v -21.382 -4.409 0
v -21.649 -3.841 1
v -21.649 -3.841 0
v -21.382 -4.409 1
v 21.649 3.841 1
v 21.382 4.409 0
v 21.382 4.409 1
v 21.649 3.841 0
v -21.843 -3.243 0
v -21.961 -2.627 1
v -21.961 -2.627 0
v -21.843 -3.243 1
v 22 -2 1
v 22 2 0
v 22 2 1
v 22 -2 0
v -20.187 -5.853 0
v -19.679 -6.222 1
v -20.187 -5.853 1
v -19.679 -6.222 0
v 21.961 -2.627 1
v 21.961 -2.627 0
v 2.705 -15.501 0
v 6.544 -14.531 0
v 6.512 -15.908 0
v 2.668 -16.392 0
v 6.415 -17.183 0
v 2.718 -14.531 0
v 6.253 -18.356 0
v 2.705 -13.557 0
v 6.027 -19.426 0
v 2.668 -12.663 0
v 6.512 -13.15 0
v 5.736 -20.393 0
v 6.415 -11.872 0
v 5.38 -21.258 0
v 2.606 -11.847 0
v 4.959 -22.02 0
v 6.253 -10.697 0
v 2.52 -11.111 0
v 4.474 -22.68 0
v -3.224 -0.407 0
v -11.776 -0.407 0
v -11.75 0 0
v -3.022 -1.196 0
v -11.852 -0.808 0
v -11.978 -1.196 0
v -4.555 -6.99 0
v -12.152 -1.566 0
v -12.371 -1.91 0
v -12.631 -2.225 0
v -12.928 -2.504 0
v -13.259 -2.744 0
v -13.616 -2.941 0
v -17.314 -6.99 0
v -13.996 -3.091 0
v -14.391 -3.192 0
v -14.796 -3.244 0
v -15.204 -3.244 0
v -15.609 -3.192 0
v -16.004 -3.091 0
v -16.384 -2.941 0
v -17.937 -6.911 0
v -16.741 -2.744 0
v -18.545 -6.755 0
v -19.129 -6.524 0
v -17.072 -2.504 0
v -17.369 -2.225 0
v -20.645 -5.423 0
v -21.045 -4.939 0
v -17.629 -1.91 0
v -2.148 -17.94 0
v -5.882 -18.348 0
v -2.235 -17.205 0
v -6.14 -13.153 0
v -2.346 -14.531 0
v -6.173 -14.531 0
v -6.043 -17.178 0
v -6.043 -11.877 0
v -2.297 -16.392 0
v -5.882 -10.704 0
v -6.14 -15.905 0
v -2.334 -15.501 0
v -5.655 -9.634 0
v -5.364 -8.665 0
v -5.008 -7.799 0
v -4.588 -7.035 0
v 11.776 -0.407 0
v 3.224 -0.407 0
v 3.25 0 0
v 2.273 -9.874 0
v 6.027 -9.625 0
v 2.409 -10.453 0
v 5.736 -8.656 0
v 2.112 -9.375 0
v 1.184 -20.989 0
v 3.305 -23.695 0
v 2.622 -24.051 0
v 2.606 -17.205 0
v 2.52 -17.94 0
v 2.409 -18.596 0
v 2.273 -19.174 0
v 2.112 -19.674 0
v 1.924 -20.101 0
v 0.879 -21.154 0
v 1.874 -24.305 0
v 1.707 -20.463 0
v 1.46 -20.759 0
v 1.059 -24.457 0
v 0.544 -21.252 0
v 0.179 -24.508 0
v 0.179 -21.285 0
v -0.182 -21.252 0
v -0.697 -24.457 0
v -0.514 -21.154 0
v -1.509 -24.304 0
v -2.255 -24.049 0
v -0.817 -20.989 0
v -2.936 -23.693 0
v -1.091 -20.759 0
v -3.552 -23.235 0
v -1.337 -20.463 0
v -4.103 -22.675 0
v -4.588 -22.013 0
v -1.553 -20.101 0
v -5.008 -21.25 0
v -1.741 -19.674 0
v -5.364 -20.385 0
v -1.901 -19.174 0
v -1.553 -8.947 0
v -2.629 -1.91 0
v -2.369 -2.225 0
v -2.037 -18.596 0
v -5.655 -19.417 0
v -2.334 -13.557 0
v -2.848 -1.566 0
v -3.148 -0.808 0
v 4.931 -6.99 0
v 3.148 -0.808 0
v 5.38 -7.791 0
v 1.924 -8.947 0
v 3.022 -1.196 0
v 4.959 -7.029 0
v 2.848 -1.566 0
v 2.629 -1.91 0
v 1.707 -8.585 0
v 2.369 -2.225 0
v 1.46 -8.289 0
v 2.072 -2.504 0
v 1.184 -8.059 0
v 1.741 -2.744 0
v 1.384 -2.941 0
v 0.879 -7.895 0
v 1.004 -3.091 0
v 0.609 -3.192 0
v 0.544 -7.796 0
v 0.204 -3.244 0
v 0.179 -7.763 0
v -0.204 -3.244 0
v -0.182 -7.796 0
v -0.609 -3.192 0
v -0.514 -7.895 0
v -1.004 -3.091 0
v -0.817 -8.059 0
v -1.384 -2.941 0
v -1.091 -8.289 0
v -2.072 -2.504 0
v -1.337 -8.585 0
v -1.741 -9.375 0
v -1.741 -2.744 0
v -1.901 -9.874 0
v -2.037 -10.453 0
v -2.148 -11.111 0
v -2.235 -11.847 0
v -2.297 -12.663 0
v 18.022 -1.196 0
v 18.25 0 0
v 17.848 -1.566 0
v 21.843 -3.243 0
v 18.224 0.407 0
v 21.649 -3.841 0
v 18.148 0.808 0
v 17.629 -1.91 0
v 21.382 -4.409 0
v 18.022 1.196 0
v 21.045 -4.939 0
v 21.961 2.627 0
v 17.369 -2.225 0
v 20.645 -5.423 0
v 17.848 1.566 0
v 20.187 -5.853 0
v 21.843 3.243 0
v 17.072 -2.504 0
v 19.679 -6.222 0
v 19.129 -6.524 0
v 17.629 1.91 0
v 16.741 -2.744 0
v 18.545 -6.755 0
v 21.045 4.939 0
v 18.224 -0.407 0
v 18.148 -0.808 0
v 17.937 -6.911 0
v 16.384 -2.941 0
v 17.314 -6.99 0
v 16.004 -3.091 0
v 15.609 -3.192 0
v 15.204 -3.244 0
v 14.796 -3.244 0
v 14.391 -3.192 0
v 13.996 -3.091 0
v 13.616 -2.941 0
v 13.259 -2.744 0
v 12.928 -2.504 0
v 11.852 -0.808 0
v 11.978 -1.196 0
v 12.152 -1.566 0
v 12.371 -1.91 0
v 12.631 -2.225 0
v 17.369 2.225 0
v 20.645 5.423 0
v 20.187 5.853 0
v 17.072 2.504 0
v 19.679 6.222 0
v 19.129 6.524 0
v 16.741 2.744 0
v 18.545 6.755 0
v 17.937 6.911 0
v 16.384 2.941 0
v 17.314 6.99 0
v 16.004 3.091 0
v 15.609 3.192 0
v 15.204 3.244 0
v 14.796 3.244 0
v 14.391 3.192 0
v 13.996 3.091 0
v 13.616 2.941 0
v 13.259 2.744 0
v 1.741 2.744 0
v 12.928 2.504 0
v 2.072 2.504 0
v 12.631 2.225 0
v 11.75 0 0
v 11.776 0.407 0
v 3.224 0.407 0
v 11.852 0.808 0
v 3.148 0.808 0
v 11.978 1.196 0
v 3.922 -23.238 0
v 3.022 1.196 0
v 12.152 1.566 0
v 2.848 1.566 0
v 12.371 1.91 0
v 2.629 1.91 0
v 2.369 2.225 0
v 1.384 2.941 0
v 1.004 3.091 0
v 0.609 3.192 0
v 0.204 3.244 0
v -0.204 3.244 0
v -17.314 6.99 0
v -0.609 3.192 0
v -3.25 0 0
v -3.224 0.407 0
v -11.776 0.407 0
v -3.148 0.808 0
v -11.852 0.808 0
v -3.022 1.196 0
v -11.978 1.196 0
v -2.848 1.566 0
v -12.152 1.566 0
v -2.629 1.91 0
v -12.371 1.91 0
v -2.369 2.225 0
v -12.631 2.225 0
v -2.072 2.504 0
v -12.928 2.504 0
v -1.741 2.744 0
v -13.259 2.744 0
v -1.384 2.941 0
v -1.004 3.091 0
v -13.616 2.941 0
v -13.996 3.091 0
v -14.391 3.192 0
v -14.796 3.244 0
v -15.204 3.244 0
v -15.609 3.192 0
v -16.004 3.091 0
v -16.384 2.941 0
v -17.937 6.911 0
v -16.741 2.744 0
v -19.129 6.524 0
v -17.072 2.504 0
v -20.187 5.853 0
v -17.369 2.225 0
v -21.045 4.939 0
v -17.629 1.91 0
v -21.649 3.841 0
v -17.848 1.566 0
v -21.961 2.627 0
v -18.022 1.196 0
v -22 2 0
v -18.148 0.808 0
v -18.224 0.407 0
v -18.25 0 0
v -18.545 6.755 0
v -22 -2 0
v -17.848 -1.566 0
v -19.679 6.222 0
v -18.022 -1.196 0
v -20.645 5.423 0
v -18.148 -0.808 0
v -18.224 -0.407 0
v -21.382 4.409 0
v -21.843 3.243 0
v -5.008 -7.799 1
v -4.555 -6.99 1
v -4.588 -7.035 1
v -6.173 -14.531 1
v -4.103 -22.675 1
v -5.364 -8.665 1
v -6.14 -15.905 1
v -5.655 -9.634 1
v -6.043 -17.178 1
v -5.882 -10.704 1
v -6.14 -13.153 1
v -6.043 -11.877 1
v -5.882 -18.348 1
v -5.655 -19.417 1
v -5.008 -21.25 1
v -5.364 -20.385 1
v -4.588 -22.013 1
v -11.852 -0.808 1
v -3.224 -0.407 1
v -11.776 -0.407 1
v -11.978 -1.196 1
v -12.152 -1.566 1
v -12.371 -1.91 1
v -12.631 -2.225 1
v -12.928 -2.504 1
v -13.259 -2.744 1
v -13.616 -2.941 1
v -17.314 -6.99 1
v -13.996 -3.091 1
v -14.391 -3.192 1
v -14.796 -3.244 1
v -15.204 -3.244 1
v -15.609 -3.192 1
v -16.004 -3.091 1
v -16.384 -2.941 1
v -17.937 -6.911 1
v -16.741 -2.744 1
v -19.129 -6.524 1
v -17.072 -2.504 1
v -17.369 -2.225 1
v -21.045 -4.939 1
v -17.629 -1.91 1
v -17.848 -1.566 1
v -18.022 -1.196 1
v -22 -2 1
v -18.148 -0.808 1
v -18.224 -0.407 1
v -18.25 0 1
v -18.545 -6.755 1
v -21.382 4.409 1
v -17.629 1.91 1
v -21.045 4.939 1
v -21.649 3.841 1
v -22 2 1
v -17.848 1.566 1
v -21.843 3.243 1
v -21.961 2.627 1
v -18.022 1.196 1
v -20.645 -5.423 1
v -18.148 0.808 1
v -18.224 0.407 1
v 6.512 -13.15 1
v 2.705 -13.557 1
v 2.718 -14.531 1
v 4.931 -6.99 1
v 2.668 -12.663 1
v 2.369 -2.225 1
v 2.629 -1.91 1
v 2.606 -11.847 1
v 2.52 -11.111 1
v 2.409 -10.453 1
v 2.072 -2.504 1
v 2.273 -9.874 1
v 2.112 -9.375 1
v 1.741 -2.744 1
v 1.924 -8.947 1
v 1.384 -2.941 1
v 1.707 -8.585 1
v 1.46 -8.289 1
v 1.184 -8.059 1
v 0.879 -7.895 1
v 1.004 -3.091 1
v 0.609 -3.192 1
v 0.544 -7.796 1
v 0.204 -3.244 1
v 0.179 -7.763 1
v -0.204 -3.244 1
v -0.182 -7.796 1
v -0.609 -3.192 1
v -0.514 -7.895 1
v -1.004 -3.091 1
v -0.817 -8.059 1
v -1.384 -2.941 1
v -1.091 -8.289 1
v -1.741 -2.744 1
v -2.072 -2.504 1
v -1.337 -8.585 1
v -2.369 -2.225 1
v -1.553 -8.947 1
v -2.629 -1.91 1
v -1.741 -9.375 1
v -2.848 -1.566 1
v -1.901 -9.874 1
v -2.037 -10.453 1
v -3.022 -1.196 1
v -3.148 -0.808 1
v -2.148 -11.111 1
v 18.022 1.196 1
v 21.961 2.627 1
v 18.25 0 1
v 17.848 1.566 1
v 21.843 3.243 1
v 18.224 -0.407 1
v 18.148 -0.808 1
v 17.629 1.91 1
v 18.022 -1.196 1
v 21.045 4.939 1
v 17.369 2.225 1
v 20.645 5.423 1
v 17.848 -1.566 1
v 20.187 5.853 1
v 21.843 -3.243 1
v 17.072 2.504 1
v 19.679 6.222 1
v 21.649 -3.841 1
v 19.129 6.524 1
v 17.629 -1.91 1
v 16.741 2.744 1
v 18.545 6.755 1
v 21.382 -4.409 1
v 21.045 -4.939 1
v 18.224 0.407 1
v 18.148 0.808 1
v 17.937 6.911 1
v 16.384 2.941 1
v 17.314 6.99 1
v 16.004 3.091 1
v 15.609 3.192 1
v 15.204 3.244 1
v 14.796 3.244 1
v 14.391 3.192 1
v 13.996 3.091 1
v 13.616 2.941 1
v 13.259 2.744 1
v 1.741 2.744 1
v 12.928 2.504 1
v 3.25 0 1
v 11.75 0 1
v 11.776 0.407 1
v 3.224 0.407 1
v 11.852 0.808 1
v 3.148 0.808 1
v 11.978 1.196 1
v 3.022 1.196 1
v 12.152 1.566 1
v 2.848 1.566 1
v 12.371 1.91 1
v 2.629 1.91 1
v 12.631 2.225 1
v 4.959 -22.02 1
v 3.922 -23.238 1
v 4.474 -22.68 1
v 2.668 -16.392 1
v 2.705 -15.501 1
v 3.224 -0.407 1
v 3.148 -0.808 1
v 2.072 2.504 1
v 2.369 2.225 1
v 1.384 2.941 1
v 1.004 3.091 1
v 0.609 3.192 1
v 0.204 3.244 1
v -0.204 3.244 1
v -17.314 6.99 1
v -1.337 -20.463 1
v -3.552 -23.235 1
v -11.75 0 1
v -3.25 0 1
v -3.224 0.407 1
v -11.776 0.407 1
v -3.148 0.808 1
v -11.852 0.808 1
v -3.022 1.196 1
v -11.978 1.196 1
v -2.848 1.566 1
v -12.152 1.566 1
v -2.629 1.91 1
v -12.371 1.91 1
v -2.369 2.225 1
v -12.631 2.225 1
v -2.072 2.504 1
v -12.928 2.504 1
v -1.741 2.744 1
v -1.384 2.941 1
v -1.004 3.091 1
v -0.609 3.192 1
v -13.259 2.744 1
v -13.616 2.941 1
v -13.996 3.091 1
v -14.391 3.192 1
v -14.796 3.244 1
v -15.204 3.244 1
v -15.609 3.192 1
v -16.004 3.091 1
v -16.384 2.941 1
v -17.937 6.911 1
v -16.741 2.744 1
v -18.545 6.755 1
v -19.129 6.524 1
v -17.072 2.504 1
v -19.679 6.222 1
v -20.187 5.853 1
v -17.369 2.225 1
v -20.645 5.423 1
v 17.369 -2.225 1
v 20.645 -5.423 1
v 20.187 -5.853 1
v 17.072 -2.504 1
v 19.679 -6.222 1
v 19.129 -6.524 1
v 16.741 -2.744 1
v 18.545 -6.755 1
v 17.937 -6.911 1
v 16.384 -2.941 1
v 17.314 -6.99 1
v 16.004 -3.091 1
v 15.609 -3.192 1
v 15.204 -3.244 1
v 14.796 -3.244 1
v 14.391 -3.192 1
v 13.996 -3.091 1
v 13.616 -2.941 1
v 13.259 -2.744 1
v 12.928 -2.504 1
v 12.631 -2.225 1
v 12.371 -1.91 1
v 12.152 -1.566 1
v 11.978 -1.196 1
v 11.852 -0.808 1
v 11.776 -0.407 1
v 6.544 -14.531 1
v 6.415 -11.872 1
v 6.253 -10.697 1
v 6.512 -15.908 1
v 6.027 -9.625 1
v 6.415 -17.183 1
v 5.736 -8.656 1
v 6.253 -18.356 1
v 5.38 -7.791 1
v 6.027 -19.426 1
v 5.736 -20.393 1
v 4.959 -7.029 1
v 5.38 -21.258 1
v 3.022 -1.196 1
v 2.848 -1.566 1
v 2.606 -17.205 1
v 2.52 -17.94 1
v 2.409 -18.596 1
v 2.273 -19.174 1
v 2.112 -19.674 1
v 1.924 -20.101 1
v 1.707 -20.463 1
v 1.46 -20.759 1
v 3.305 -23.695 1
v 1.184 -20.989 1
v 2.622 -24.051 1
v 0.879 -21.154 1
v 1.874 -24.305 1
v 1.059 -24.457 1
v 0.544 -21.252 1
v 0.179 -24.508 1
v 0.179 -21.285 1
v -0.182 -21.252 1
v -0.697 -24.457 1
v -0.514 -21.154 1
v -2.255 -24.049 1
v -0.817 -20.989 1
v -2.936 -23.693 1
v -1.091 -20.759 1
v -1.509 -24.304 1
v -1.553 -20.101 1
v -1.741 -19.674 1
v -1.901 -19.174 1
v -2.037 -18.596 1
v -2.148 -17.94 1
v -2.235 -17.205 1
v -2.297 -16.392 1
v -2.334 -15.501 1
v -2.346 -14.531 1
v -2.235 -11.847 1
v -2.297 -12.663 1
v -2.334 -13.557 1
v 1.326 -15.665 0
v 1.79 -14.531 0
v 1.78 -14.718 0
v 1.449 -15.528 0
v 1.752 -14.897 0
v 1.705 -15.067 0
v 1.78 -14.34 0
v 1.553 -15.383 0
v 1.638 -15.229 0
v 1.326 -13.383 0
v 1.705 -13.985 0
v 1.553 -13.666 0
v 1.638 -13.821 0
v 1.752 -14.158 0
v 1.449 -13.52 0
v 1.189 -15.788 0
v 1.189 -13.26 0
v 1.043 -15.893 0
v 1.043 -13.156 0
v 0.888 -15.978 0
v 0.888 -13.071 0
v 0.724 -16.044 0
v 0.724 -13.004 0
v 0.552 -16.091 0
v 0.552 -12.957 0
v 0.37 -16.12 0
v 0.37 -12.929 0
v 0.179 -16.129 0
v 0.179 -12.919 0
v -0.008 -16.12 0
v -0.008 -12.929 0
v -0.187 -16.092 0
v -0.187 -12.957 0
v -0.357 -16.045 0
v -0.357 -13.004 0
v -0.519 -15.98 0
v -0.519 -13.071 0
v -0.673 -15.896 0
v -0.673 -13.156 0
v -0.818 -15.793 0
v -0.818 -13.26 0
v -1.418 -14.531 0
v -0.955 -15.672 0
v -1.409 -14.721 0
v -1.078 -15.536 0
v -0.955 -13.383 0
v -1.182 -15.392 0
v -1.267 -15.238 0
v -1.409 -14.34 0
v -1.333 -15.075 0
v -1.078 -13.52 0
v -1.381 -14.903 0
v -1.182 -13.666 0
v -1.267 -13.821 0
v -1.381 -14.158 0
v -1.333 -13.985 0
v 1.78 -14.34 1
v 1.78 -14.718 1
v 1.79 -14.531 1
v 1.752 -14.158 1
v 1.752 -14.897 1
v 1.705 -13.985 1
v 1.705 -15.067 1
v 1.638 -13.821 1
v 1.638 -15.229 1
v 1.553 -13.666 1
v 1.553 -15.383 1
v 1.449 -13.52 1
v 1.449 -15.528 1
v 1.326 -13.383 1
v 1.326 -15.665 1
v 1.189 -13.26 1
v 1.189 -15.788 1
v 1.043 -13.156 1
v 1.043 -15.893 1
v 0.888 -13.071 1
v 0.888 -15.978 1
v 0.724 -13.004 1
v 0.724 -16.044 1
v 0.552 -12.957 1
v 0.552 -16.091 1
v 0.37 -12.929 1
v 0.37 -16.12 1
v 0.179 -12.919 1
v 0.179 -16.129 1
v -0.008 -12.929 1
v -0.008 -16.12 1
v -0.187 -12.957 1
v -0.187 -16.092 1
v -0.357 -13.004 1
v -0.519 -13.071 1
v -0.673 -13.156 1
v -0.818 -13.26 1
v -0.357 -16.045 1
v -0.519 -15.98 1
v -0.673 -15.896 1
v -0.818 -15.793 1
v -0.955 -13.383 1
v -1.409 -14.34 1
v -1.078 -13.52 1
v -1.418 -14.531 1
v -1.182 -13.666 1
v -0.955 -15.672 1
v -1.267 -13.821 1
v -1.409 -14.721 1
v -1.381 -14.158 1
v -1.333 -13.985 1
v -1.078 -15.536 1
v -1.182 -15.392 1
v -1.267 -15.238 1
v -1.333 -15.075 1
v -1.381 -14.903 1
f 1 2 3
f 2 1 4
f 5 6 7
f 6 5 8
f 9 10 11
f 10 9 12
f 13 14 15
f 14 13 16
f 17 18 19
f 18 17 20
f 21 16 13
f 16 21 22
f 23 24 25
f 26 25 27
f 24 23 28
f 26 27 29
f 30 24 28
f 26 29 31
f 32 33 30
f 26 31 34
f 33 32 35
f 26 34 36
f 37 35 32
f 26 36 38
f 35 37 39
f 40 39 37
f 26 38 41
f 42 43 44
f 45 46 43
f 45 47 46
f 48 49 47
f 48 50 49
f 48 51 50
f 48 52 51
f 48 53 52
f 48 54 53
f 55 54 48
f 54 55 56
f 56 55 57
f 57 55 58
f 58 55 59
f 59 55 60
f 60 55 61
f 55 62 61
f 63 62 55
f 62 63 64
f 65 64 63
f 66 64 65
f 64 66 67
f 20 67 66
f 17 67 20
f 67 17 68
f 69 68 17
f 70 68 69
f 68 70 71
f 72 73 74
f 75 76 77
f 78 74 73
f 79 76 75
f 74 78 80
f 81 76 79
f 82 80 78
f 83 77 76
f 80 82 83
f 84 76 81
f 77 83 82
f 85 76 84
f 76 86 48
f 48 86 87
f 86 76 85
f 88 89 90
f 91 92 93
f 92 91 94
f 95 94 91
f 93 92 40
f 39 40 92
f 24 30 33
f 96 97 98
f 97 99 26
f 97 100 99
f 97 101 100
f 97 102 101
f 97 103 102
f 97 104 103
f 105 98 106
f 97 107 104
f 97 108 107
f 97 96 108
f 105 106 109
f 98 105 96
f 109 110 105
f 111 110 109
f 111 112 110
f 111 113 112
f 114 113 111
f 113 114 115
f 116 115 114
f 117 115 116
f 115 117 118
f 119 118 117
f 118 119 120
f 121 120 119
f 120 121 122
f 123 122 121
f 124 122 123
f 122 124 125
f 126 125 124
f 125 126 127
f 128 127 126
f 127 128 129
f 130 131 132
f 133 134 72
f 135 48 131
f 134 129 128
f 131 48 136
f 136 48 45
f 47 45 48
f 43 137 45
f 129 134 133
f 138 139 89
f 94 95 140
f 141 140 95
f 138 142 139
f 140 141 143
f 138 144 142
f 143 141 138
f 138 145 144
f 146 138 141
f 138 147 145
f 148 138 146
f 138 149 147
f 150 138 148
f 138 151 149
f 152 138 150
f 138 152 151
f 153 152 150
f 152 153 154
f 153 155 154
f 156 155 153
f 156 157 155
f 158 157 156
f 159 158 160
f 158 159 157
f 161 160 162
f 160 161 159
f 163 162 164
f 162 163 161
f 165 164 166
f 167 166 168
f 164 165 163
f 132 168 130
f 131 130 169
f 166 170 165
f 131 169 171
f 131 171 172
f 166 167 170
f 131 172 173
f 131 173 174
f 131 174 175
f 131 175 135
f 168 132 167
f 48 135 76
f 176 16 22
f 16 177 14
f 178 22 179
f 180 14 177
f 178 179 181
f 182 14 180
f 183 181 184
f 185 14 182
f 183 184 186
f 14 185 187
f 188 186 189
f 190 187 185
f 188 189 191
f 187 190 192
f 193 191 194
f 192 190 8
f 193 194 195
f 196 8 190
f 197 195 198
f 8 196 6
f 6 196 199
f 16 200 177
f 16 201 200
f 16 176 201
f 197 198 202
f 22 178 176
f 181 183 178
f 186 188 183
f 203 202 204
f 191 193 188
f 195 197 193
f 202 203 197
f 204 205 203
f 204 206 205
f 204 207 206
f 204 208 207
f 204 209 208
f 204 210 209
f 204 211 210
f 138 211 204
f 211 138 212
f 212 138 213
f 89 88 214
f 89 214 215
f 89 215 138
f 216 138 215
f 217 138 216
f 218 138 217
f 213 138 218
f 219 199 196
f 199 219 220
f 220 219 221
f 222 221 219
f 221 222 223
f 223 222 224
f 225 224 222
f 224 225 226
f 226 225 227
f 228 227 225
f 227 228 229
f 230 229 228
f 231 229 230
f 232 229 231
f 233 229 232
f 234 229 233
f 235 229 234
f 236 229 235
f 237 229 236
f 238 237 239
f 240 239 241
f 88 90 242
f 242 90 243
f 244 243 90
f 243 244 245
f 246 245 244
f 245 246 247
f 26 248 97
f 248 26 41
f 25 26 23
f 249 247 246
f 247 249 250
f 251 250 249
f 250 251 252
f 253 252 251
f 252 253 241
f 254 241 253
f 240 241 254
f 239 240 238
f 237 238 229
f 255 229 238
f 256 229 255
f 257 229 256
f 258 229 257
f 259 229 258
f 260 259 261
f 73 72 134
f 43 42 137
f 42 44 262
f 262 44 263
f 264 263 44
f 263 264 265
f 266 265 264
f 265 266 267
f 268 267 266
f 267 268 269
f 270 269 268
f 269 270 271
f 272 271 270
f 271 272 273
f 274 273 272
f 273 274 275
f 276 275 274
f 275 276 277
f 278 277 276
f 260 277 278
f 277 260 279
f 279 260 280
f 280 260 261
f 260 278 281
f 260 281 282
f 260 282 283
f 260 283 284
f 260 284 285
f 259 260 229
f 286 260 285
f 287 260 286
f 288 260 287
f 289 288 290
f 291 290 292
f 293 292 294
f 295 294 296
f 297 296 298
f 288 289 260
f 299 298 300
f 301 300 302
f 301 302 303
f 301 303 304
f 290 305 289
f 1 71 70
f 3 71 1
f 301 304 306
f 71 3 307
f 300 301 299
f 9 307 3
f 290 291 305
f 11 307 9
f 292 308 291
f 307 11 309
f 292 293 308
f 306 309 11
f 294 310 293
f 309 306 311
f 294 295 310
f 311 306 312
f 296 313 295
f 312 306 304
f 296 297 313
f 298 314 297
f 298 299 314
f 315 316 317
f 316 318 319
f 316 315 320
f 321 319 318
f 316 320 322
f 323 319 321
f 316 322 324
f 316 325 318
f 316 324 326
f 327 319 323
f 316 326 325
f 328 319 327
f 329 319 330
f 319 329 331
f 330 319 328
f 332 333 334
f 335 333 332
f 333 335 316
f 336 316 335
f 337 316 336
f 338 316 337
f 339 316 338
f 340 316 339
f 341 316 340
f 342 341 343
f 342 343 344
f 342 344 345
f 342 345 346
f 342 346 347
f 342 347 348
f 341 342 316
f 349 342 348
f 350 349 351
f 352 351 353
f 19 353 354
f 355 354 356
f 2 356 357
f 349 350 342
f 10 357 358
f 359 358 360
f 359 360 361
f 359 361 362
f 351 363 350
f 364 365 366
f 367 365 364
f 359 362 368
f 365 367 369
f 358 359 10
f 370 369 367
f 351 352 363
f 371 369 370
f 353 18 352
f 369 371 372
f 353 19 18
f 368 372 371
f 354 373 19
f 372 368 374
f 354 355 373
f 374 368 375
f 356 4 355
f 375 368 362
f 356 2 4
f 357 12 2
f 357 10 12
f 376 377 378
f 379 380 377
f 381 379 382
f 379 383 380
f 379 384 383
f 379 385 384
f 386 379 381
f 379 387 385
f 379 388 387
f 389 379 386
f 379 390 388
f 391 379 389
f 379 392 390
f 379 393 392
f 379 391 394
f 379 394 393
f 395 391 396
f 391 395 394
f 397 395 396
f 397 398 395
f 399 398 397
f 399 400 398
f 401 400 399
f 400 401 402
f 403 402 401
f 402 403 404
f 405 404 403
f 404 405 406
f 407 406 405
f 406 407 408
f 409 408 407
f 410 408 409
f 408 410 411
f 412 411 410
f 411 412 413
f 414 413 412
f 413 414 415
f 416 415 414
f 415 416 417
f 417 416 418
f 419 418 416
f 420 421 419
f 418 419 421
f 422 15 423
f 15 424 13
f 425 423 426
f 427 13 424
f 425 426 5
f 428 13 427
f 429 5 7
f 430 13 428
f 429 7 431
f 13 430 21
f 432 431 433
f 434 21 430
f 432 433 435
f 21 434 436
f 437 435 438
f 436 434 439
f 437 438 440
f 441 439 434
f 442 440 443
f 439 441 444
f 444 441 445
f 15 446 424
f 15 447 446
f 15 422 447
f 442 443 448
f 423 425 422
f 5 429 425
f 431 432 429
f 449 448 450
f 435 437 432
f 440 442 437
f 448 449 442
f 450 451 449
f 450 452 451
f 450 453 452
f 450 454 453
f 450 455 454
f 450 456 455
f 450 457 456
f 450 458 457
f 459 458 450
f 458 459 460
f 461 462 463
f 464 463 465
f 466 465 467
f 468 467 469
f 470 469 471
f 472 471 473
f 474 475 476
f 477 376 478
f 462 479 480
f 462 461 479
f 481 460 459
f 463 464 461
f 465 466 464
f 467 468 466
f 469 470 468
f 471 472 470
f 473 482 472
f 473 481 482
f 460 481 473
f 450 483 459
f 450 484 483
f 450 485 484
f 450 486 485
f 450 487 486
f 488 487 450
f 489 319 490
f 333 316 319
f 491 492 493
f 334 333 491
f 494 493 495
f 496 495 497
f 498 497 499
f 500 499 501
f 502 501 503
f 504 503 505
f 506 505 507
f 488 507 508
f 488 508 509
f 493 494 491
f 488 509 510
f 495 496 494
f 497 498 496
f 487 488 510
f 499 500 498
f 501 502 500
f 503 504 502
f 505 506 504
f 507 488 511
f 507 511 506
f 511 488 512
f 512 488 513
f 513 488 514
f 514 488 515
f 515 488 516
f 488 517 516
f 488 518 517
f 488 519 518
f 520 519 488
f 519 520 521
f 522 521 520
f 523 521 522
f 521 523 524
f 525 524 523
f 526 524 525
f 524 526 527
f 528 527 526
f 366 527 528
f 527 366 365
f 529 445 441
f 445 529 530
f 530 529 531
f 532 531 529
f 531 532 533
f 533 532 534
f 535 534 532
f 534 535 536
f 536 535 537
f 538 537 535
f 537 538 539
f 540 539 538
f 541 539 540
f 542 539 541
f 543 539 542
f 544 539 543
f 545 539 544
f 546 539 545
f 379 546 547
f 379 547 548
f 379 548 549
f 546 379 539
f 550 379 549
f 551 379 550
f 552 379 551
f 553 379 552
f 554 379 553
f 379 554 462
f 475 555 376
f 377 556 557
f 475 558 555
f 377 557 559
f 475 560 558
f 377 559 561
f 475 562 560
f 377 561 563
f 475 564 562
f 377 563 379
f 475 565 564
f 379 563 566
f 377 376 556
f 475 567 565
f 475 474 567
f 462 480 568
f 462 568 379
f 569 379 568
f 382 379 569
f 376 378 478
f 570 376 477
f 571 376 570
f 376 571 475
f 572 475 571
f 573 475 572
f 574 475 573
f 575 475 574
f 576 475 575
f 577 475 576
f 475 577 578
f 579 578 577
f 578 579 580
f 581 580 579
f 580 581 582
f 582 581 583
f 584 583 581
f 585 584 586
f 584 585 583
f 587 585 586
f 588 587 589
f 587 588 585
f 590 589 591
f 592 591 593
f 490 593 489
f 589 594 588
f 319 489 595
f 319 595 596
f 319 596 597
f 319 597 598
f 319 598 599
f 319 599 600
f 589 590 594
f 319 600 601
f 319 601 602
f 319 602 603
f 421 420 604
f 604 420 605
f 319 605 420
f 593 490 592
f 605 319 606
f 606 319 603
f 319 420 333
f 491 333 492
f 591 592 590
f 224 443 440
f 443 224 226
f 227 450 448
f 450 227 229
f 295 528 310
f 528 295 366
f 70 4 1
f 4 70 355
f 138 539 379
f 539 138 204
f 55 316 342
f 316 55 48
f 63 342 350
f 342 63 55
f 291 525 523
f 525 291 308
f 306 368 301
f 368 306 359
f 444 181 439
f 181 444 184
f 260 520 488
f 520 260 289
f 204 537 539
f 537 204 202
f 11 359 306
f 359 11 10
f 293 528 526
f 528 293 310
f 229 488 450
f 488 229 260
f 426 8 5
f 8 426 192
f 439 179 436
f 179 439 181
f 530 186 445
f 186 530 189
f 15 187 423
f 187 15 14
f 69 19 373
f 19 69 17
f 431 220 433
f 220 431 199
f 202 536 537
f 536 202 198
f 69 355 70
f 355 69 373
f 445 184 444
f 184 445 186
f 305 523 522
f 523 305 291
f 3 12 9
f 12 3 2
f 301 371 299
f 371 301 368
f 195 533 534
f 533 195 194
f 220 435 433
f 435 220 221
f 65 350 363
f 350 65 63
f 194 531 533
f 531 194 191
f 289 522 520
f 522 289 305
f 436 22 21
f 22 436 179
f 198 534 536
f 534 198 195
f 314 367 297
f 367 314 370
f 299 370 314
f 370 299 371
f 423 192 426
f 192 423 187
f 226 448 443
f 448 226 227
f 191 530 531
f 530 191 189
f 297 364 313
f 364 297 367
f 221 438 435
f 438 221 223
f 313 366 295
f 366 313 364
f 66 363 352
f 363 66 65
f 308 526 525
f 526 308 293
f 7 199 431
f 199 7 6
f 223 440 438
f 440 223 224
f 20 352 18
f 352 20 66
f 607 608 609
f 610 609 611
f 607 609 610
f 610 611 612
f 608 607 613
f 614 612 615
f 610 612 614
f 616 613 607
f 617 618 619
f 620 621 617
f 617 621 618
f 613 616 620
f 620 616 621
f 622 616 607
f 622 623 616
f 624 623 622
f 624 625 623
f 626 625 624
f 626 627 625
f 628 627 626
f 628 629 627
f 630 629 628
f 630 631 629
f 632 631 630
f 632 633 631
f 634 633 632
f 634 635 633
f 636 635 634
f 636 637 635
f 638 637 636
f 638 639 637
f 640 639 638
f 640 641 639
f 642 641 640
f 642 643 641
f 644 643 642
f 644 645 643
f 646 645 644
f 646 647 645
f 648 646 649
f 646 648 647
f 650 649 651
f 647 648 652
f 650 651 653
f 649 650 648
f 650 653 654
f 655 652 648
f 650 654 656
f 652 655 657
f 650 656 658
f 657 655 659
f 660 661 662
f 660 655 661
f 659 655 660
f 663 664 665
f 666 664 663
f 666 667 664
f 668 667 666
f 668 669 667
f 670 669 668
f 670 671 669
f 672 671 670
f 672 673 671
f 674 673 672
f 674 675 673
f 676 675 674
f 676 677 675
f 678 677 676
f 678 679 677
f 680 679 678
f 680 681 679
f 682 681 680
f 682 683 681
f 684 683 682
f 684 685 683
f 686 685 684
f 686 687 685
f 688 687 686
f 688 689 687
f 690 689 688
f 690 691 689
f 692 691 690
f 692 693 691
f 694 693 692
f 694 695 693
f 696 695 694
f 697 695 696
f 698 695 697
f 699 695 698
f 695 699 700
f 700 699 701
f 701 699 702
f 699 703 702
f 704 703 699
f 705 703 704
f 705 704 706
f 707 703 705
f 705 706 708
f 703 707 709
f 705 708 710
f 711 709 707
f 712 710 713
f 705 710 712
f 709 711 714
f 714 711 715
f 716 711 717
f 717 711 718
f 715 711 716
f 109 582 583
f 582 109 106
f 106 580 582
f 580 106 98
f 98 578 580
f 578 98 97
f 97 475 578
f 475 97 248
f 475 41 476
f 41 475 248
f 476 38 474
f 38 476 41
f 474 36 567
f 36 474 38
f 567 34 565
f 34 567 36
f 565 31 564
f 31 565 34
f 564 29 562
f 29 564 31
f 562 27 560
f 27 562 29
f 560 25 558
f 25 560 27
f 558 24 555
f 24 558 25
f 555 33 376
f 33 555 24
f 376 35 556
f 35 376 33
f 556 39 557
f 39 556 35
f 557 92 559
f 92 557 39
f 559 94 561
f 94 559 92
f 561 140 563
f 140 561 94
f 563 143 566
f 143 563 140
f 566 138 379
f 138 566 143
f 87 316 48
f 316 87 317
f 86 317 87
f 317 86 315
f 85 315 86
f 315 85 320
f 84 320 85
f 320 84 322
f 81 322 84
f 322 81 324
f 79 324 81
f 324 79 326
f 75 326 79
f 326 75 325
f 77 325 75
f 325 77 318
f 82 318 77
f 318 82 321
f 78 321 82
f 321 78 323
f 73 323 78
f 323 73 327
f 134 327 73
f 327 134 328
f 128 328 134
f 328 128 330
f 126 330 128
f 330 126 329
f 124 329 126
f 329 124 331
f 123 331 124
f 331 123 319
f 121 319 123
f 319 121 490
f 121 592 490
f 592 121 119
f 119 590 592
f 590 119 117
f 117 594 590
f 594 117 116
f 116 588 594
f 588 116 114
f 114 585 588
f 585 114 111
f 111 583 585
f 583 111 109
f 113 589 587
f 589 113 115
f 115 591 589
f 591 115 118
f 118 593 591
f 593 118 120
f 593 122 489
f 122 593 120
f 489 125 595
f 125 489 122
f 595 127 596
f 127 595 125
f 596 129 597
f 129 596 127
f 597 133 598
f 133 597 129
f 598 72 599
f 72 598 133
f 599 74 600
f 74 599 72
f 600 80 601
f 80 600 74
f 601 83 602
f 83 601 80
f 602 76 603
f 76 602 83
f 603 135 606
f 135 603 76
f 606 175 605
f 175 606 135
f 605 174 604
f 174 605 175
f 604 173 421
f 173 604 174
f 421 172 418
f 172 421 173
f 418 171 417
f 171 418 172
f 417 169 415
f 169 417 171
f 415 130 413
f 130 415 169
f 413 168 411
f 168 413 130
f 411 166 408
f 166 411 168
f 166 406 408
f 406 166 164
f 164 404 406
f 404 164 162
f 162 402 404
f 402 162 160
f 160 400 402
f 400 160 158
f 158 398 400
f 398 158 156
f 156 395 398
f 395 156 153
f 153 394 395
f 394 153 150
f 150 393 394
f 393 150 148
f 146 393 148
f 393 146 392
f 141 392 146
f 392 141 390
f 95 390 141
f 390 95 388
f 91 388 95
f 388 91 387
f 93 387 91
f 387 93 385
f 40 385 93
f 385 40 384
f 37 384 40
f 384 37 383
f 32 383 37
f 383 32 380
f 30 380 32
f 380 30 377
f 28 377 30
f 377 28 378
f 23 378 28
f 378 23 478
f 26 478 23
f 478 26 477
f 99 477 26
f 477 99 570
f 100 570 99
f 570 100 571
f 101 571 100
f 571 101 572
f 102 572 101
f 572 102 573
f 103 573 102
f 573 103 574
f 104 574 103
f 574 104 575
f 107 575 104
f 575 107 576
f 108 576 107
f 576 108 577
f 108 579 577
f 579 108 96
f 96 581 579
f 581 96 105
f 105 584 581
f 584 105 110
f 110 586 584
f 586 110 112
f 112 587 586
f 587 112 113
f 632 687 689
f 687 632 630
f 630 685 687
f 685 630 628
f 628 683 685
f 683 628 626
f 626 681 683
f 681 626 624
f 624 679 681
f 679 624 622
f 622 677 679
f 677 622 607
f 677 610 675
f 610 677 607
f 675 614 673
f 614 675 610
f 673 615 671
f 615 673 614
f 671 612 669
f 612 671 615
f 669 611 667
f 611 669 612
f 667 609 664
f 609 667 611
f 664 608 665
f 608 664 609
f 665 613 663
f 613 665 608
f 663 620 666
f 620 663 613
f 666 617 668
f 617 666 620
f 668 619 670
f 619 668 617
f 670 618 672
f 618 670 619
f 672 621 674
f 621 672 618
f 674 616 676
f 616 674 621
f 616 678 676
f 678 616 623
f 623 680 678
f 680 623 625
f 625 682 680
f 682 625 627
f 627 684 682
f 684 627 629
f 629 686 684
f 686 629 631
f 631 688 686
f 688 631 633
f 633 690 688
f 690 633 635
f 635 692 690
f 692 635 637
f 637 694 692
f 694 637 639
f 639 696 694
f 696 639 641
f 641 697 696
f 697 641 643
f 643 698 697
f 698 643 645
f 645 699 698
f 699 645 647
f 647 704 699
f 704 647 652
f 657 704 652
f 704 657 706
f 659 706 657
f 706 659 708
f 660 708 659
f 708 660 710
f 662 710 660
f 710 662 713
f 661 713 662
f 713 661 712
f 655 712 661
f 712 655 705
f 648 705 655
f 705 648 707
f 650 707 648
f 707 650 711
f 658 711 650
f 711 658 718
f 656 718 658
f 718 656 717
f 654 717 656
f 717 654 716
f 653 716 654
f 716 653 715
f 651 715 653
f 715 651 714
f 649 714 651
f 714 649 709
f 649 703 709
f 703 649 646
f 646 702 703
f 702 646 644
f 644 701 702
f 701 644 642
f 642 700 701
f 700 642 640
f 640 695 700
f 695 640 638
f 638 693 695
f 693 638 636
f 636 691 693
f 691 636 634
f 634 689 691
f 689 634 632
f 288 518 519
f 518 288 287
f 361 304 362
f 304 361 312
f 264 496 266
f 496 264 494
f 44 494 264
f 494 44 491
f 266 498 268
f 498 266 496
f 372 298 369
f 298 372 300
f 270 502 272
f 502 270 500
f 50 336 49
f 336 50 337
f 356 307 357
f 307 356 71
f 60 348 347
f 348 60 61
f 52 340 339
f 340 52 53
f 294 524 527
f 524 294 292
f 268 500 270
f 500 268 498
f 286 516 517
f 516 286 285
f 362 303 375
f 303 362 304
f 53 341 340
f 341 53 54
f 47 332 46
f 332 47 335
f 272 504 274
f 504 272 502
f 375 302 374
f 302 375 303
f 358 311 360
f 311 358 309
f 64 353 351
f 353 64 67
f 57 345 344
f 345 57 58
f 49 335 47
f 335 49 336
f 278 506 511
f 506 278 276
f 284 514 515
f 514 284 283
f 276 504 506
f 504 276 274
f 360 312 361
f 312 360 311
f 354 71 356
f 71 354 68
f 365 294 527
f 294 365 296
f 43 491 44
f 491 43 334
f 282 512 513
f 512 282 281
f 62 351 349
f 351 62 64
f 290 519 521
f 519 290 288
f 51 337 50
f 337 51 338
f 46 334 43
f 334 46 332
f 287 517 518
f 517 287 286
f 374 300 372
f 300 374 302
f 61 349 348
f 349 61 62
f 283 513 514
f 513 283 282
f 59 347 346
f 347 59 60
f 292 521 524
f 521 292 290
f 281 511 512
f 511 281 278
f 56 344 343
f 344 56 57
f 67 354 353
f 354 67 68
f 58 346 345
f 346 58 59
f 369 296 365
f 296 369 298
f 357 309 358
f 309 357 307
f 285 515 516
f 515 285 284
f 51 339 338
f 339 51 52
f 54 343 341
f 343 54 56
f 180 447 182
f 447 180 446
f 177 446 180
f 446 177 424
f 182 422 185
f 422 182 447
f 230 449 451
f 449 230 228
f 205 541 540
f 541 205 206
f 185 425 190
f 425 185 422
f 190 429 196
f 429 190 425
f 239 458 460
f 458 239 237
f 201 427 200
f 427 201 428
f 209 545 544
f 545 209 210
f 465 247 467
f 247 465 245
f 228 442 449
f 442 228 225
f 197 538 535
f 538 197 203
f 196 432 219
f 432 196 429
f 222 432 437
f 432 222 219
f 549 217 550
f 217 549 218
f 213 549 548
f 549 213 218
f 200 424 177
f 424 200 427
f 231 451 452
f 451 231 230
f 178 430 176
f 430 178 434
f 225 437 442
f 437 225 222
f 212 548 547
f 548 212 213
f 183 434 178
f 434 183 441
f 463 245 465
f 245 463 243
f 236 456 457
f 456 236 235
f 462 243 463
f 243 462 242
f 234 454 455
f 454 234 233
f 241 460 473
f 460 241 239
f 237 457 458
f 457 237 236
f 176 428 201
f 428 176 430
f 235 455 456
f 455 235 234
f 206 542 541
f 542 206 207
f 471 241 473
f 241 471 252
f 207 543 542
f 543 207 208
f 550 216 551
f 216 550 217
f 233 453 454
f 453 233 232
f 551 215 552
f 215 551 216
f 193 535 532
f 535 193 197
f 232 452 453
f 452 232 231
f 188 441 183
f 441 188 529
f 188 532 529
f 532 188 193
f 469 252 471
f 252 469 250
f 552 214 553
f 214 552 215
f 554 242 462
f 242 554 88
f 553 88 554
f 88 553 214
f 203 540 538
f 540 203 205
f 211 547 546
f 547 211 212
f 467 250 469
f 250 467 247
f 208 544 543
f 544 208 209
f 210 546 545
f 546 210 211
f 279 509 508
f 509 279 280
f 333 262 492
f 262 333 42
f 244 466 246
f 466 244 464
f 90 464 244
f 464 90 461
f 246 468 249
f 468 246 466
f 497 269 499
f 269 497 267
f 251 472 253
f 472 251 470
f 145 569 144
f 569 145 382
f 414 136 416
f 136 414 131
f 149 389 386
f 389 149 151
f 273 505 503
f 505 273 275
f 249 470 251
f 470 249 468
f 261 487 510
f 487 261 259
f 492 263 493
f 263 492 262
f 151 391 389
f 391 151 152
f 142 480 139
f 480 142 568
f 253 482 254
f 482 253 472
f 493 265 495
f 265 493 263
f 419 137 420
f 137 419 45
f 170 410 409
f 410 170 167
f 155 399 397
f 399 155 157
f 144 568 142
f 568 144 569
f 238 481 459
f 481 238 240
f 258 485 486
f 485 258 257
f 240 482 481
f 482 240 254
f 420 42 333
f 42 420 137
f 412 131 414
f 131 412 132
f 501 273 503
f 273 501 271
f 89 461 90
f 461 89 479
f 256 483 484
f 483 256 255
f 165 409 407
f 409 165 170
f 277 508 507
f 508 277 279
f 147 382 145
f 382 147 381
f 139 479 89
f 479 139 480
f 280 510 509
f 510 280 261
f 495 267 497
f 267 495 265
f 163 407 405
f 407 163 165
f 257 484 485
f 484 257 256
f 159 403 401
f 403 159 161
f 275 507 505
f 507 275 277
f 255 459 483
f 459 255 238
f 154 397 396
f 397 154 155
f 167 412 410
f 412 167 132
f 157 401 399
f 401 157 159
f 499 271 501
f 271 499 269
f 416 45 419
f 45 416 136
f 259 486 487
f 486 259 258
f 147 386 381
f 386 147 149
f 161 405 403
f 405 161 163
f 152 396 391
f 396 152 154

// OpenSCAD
$fn = 50;


difference() {
	union() {
		translate(v = [0, 0, 0]) {
			rotate(a = [0, 0, 0]) {
				hull() {
					translate(v = [-17.0000000000, 2.0000000000, 0]) {
						rotate(a = [0, 0, 0]) {
							translate(v = [0, 0, 0]) {
								rotate(a = [0, 0, 0]) {
									cylinder(h = 1, r = 5);
								}
							}
						}
					}
					translate(v = [17.0000000000, 2.0000000000, 0]) {
						rotate(a = [0, 0, 0]) {
							translate(v = [0, 0, 0]) {
								rotate(a = [0, 0, 0]) {
									cylinder(h = 1, r = 5);
								}
							}
						}
					}
					translate(v = [-17.0000000000, -2.0000000000, 0]) {
						rotate(a = [0, 0, 0]) {
							translate(v = [0, 0, 0]) {
								rotate(a = [0, 0, 0]) {
									cylinder(h = 1, r = 5);
								}
							}
						}
					}
					translate(v = [17.0000000000, -2.0000000000, 0]) {
						rotate(a = [0, 0, 0]) {
							translate(v = [0, 0, 0]) {
								rotate(a = [0, 0, 0]) {
									cylinder(h = 1, r = 5);
								}
							}
						}
					}
				}
			}
		}
		translate(v = [0, -5, 0]) {
			rotate(a = [0, 0, 0]) {
				linear_extrude(height = 1) {
					text(font = "DejaVu Sans Mono:style=Bold", halign = "center", size = 19.0000000000, text = "0", valign = "top");
				}
			}
		}
	}
	union() {
		translate(v = [-15.0000000000, 0.0000000000, -125.0000000000]) {
			rotate(a = [0, 0, 0]) {
				cylinder(h = 250, r = 3.2500000000);
			}
		}
		translate(v = [15.0000000000, 0.0000000000, -125.0000000000]) {
			rotate(a = [0, 0, 0]) {
				cylinder(h = 250, r = 3.2500000000);
			}
		}
		translate(v = [15.0000000000, 0.0000000000, -125.0000000000]) {
			rotate(a = [0, 0, 0]) {
				cylinder(h = 250, r = 3.2500000000);
			}
		}
		translate(v = [0, 0, -125.0000000000]) {
			rotate(a = [0, 0, 0]) {
				cylinder(h = 250, r = 3.2500000000);
			}
		}
	}
}
